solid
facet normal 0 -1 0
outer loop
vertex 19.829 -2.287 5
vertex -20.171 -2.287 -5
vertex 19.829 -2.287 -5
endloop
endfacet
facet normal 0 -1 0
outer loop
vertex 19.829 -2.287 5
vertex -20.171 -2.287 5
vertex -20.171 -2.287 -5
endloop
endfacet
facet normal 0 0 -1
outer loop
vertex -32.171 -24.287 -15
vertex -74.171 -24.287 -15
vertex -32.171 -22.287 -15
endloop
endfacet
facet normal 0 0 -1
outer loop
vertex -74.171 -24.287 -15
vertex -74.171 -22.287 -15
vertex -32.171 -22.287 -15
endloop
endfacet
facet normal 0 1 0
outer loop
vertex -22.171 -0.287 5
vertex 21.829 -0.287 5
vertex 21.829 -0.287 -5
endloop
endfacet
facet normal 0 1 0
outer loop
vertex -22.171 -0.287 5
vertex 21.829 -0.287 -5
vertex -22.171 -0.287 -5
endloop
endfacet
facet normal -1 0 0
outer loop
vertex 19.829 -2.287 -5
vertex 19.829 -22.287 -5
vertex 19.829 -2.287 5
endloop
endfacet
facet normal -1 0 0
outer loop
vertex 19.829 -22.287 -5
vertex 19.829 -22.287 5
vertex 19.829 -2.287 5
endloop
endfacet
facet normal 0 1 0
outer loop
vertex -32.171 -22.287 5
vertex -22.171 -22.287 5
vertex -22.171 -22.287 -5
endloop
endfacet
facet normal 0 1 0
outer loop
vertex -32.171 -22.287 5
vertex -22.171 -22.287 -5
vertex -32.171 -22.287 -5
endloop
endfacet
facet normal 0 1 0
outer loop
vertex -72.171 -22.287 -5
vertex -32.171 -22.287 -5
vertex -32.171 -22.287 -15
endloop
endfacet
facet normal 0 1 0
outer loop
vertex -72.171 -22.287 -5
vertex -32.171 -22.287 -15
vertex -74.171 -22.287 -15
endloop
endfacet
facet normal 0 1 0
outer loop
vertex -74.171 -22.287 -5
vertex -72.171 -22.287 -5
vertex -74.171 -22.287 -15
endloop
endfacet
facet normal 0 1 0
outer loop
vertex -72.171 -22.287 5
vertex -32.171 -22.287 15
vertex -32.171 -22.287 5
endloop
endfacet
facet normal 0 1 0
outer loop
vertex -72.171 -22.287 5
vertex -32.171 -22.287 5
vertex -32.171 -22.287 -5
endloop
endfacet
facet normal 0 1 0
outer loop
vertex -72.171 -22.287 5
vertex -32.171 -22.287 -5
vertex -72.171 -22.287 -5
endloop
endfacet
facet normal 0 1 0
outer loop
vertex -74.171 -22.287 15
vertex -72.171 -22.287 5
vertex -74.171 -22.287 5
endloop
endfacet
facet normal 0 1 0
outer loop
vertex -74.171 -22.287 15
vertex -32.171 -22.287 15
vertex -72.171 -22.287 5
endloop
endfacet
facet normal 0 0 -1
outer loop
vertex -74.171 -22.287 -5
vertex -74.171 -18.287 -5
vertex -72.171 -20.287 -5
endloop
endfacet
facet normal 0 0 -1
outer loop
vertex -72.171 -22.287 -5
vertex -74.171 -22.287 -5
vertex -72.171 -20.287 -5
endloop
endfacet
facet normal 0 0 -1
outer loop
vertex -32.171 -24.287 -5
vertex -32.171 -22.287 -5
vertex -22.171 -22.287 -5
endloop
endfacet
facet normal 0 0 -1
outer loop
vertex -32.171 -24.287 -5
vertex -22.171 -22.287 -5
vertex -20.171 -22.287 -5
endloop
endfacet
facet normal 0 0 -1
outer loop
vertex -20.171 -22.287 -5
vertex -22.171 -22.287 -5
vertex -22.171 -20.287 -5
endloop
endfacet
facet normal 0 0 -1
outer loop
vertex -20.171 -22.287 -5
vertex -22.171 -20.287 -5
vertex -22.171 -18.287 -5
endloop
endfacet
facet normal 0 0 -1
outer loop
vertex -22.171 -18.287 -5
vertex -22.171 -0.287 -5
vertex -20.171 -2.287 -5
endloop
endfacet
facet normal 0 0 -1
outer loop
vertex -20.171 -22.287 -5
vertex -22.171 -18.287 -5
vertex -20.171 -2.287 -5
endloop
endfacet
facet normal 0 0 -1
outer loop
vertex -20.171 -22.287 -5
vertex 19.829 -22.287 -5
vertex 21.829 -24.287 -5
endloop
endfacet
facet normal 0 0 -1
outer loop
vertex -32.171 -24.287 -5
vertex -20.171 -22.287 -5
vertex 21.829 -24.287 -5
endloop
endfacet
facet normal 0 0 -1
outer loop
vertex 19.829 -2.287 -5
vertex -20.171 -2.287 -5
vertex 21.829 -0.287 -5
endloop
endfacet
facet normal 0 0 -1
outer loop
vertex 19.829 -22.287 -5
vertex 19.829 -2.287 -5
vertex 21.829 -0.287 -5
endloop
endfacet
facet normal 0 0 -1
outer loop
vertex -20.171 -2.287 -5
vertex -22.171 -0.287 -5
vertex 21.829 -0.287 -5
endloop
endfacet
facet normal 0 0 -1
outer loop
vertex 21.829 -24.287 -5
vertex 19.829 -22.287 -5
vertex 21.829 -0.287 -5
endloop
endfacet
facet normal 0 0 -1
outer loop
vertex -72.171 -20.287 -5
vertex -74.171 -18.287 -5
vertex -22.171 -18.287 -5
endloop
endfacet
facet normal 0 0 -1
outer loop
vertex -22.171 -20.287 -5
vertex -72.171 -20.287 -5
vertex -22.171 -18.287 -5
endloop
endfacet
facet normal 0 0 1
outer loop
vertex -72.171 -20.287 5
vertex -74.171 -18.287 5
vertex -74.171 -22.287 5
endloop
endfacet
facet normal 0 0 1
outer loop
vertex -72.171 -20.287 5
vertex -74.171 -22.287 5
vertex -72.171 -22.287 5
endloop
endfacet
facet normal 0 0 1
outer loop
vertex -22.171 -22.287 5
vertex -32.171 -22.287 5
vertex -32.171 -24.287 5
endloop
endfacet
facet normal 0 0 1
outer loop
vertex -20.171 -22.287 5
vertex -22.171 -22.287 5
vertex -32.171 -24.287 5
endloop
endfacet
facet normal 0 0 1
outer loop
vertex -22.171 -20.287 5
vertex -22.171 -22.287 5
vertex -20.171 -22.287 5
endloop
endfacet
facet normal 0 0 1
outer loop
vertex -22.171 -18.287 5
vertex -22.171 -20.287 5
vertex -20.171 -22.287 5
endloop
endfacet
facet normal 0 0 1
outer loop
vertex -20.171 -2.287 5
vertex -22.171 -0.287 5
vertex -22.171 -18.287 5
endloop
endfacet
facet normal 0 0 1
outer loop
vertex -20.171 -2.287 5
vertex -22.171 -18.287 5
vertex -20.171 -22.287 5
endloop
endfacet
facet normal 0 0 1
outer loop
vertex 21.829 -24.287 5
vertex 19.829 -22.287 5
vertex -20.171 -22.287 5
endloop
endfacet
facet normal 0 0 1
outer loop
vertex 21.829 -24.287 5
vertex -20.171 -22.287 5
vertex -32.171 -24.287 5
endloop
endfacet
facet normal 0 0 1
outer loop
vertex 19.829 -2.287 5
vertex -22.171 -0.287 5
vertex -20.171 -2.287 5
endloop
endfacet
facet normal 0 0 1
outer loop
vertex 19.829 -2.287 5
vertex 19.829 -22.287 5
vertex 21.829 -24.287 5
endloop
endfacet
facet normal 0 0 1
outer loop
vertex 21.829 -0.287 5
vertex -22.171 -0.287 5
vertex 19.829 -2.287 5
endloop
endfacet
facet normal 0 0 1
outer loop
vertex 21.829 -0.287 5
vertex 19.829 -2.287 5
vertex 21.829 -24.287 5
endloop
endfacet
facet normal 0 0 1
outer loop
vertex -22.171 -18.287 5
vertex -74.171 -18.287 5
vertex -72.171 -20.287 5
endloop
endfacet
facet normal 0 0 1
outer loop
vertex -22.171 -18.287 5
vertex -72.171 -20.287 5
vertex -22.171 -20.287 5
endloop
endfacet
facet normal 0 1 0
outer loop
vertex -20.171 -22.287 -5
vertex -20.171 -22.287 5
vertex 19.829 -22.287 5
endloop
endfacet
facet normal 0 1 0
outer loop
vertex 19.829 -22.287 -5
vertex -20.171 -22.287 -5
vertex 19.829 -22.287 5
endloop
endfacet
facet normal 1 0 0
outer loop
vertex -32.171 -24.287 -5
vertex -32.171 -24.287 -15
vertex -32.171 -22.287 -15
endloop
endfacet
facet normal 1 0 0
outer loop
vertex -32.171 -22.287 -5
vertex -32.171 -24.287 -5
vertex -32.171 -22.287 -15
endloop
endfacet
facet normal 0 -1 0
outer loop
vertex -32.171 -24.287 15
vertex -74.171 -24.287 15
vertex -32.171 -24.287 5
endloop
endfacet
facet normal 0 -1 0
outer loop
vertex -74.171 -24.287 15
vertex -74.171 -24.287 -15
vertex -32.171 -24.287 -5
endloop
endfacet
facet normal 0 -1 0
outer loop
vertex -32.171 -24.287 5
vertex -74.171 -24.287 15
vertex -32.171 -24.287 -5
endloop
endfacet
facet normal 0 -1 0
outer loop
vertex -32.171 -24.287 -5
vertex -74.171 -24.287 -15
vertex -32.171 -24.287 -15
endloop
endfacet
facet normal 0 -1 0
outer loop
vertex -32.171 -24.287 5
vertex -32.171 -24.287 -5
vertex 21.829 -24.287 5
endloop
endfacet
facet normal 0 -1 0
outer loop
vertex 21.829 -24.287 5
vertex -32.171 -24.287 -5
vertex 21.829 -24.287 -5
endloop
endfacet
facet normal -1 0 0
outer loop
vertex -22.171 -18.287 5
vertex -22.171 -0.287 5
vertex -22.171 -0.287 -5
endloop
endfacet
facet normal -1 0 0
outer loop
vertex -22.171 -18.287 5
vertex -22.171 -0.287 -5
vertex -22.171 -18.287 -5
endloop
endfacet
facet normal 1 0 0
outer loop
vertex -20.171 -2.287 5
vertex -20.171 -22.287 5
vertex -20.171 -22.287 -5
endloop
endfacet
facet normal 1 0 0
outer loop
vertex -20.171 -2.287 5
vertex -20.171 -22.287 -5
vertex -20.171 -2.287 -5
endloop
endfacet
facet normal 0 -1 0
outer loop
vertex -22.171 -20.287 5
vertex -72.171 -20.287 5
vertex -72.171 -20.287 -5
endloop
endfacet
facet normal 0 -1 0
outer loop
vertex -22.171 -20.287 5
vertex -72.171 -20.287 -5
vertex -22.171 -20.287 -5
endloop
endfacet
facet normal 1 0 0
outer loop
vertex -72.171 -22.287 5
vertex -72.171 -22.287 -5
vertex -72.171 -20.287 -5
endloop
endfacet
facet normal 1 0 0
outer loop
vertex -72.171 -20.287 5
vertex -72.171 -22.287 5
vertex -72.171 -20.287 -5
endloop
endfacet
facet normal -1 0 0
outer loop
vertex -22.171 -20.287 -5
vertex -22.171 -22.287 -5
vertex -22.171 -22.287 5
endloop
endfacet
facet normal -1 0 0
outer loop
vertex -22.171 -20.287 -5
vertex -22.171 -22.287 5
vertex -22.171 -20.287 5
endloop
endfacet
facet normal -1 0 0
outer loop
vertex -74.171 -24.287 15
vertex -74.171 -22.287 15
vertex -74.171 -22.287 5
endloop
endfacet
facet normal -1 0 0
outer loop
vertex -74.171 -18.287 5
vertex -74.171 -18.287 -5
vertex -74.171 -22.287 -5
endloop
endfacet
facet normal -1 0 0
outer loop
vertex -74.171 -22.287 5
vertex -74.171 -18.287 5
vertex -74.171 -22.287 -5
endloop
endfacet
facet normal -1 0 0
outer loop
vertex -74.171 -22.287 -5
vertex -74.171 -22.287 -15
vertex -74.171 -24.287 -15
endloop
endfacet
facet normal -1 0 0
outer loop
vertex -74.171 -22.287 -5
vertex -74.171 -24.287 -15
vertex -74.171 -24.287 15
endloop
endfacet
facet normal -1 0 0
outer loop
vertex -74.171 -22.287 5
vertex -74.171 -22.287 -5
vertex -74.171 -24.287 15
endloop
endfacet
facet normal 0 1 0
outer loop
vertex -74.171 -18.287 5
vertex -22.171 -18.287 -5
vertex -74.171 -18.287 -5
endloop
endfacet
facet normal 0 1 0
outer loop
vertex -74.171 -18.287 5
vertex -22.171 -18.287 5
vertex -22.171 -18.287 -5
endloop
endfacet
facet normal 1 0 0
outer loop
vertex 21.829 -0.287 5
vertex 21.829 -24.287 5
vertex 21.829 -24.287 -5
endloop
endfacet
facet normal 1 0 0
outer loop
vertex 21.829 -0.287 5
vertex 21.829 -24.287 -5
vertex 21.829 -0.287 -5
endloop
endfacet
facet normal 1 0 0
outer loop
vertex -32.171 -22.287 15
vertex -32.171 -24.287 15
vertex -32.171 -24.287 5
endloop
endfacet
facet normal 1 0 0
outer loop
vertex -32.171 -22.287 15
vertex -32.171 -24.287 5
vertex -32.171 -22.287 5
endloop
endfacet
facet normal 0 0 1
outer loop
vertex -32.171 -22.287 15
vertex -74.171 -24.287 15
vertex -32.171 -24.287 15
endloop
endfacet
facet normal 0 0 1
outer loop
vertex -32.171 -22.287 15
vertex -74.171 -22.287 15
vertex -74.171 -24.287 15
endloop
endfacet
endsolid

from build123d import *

# Parameters (mm, degrees)
EXTRUDE_1_DEPTH      = 5
EXTRUDE_1_DEPTH_BACK = 5
SKETCH_1_W           = 50
SKETCH_1_H           = 2
SKETCH_1_W_2         = 40
SKETCH_1_H_2         = 20
EXTRUDE_2_DEPTH      = 10
EXTRUDE_2_DEPTH_BACK = 20


with BuildPart() as part:
    # 草图1 → 凸台-拉伸1 (new, two sides: drawn at the far end of the back side and taken through both)
    with BuildSketch(Plane.XY.offset(-EXTRUDE_1_DEPTH_BACK)):
        Polygon((-74.170588235, -24.287254902), (-22.170588235, -24.287254902), (21.829411765, -24.287254902), (21.829411765, -0.287254902), (-22.170588235, -0.287254902), (-22.170588235, -18.287254902), (-74.170588235, -18.287254902), (-74.170588235, -22.287254902), align=None)
        with Locations((-47.170588235, -21.287254902)):
            Rectangle(SKETCH_1_W, SKETCH_1_H, mode=Mode.SUBTRACT)
        with Locations((-0.170588235, -12.287254902)):
            Rectangle(SKETCH_1_W_2, SKETCH_1_H_2, mode=Mode.SUBTRACT)
    extrude(amount=EXTRUDE_1_DEPTH + EXTRUDE_1_DEPTH_BACK)

    # 草图2 → 凸台-拉伸2 (add, two sides: drawn at the far end of the back side and taken through both)
    with BuildSketch(Plane.XY.offset(5).offset(-EXTRUDE_2_DEPTH_BACK)):
        Polygon((-74.170588235, -24.287254902), (-32.170588235, -24.287254902), (-32.170588235, -22.287254902), (-72.170588235, -22.287254902), (-74.170588235, -22.287254902), align=None)
    extrude(amount=EXTRUDE_2_DEPTH + EXTRUDE_2_DEPTH_BACK)


solid = part.part
